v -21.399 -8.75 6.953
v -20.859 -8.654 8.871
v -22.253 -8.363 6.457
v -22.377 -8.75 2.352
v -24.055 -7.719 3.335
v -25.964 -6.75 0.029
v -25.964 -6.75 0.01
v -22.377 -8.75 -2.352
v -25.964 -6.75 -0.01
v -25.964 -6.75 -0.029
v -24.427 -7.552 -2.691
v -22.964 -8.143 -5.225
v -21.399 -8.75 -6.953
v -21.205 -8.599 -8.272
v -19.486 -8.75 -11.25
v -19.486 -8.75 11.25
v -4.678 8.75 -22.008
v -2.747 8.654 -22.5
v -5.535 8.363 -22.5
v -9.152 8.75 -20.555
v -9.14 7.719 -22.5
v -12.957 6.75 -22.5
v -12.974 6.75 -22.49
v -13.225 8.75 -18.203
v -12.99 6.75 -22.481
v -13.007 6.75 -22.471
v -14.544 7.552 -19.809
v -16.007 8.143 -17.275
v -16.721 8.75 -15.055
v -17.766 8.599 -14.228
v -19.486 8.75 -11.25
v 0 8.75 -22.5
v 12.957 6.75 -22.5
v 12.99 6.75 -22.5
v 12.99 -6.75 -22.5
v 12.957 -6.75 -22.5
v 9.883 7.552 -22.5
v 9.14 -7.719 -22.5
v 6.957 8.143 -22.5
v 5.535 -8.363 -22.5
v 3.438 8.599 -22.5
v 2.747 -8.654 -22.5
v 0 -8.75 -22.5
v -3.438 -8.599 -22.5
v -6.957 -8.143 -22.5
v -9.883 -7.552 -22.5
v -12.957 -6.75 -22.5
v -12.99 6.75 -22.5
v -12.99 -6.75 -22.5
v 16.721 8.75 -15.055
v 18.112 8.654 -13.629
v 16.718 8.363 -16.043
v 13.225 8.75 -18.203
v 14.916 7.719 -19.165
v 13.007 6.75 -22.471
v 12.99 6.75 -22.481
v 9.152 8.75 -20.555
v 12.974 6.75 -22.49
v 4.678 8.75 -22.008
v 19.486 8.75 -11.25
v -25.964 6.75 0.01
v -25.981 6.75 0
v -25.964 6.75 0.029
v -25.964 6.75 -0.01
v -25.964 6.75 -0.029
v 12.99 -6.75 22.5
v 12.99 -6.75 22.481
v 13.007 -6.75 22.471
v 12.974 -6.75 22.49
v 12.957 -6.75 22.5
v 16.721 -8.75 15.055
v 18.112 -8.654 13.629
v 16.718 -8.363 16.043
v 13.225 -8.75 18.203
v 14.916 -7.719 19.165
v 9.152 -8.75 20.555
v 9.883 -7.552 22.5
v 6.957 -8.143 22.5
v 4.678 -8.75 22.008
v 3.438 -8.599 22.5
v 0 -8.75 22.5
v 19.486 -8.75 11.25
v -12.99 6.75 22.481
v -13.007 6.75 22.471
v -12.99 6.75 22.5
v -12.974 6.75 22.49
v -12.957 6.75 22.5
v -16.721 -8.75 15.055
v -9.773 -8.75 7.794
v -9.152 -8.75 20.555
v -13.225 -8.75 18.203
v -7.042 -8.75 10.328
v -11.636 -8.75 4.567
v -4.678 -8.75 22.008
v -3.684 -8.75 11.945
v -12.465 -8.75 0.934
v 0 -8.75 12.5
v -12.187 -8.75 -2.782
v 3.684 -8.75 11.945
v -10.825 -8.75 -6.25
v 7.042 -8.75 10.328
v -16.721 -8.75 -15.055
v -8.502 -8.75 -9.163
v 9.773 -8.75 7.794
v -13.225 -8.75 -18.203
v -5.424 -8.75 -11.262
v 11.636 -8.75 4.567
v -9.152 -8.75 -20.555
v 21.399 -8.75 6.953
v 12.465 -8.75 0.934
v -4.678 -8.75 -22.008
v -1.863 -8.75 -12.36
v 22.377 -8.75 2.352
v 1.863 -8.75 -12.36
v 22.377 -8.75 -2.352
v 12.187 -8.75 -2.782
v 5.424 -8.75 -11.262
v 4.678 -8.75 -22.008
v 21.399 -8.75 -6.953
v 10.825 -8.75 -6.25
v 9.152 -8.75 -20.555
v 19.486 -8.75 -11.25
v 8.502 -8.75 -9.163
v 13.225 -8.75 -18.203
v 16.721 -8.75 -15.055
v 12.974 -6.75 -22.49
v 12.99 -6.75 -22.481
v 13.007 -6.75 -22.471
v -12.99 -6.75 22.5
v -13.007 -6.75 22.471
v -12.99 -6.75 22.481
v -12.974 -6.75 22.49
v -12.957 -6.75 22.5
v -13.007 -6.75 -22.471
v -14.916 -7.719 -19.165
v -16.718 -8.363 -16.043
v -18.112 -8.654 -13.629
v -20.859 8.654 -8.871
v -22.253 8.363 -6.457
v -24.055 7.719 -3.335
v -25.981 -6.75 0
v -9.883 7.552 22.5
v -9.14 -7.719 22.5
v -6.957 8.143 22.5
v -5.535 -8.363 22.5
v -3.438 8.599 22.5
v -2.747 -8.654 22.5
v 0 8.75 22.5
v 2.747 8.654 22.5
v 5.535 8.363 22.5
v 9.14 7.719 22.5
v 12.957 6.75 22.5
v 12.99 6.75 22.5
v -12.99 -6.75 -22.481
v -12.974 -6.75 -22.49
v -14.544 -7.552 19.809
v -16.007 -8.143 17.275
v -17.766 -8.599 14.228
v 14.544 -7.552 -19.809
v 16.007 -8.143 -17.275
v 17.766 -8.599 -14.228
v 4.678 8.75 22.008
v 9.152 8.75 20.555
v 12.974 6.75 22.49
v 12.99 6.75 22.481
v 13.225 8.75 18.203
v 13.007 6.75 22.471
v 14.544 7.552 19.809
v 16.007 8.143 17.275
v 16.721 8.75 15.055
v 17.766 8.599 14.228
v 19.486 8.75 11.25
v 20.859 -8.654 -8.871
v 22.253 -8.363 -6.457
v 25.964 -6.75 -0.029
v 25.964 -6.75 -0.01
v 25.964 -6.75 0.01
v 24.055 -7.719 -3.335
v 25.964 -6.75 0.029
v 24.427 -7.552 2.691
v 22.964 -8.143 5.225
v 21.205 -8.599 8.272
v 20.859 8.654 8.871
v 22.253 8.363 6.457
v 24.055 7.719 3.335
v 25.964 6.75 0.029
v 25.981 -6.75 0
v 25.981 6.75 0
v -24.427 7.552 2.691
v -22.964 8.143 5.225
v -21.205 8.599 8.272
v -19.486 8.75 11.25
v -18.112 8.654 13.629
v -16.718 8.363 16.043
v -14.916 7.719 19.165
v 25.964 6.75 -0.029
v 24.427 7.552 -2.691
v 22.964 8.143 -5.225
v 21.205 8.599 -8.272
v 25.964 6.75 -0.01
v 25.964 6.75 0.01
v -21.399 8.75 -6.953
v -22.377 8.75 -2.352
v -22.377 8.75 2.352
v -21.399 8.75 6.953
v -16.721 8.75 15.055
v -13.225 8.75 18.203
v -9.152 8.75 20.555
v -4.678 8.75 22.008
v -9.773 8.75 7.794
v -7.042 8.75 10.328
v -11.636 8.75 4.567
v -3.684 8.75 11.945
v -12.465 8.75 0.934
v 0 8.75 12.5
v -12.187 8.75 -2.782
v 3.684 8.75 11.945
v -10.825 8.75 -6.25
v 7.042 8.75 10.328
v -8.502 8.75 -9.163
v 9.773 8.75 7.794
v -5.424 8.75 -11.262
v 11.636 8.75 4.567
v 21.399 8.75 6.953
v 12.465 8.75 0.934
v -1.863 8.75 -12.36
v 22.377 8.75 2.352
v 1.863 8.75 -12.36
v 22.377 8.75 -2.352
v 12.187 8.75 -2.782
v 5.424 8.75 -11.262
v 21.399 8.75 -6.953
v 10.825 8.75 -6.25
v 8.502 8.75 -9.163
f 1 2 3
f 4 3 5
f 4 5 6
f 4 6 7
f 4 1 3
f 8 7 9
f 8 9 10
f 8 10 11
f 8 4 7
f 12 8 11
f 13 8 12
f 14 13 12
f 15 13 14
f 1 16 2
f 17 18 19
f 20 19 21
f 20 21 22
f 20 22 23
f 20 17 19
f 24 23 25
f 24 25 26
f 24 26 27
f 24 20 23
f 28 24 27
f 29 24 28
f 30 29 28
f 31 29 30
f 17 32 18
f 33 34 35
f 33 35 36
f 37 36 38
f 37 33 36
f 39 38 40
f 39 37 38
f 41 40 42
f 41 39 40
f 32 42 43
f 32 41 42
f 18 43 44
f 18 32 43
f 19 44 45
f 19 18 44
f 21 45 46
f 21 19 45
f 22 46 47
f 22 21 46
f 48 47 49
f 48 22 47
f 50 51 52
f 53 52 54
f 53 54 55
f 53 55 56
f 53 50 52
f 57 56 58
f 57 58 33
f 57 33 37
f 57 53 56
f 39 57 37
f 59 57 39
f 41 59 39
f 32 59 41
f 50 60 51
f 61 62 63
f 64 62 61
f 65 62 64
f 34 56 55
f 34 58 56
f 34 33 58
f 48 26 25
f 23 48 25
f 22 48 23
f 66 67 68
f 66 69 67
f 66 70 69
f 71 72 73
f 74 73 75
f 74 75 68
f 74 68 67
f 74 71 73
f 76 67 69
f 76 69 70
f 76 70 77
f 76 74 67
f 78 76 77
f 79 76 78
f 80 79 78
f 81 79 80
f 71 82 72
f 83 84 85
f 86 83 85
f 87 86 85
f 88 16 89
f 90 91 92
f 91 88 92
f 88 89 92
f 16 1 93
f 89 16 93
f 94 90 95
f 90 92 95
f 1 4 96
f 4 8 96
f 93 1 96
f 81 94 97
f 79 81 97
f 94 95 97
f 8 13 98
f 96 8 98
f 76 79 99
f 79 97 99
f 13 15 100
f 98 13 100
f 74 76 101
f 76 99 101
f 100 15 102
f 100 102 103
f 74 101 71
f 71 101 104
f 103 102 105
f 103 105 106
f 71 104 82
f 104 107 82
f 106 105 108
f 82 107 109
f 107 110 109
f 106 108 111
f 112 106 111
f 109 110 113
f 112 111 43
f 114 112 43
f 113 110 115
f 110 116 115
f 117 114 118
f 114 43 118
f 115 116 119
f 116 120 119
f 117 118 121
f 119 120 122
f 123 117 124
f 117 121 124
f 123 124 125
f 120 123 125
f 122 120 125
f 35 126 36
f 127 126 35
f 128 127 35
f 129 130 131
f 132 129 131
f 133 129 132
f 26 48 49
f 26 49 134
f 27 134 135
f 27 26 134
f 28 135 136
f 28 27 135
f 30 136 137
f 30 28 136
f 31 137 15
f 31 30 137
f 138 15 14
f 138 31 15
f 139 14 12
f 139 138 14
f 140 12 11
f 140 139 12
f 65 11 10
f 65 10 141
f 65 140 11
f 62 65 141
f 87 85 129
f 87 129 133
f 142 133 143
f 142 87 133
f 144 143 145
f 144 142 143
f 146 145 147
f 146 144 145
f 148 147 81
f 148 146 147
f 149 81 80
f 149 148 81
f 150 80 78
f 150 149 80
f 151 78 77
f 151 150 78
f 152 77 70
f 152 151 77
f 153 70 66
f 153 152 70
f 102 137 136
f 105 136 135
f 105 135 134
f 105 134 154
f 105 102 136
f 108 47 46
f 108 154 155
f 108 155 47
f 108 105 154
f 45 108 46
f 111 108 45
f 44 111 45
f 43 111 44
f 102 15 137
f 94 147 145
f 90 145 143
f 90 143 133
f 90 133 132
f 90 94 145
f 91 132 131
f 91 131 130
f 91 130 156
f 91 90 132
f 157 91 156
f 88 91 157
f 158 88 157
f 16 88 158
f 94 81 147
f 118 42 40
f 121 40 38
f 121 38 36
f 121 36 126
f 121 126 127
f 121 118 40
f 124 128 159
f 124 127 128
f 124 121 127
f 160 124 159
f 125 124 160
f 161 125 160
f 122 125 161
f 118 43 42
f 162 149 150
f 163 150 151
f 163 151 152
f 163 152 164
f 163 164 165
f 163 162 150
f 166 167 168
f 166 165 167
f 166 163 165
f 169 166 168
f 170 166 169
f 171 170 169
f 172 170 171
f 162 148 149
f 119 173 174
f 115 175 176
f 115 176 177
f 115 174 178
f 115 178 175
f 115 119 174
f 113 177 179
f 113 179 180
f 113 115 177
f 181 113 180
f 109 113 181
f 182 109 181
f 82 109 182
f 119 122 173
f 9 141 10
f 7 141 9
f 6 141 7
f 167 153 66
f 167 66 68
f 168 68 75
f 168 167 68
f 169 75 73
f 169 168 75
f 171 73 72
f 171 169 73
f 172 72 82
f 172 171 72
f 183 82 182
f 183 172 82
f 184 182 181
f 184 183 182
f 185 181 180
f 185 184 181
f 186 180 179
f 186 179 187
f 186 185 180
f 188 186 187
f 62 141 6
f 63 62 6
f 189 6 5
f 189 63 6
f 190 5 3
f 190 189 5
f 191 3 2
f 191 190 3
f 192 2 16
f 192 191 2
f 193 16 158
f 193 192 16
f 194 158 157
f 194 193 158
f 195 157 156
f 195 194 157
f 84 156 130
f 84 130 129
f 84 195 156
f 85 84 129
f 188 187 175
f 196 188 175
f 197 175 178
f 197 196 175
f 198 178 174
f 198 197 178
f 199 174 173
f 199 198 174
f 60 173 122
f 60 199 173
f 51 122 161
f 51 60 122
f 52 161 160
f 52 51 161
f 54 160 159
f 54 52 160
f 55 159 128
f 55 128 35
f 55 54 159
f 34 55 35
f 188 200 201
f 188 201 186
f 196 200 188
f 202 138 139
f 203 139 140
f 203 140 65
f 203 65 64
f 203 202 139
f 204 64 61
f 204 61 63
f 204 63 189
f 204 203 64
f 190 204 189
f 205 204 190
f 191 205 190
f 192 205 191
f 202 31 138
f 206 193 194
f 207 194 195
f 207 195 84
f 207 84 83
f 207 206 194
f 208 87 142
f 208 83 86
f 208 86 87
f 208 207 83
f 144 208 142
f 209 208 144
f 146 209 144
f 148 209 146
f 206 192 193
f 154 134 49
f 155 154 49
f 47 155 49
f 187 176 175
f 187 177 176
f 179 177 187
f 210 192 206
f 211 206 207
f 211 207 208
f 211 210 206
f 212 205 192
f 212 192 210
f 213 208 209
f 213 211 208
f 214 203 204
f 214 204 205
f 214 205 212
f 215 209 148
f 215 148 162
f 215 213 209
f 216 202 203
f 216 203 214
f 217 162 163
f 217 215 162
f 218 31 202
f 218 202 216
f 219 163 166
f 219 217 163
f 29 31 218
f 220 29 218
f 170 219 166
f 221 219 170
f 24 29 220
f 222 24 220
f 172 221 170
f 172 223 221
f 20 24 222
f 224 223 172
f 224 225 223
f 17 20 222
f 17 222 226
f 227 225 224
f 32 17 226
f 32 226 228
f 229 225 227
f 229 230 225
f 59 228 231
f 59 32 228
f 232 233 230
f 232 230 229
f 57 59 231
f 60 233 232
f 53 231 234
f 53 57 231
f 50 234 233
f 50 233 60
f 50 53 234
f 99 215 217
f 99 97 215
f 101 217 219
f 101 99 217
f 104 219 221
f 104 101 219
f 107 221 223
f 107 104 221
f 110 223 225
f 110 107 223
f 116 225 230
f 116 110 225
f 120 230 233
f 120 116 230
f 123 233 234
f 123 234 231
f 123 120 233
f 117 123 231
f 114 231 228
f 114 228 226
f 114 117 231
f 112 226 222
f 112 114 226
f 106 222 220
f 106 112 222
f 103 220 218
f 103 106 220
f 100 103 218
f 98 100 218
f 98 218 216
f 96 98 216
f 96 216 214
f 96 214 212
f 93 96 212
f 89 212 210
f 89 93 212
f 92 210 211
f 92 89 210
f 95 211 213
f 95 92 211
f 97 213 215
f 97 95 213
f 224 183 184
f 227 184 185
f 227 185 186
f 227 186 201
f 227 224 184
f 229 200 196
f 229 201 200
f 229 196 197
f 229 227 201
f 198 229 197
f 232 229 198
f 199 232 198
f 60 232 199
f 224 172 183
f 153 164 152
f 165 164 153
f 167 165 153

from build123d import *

# Parameters (mm, degrees)
SKETCH3_R               = 12.5
BOSS_EXTRUDE1_DEPTH     = 8.75
SKETCH4_OUTSIDE_W       = 75.076
SKETCH4_OUTSIDE_H       = 68.114
SKETCH4_OUTSIDE_R       = 22.5
CUT_EXTRUDE1_DEPTH      = 2
CUT_EXTRUDE1_DRAFT      = -60
MIRROR1_COPY_1_SKETCH_W = 75.076
MIRROR1_COPY_1_SKETCH_H = 68.114
MIRROR1_COPY_1_SKETCH_R = 22.5
MIRROR1_COPY_1_DEPTH    = 2
MIRROR1_COPY_1_DRAFT    = -60


with BuildPart() as part:
    # Sketch3 → Boss-Extrude1 (new, symmetric)
    with BuildSketch(Plane(origin=(0, 0, 0), x_dir=(1, 0, 0), z_dir=(0, 1, 0))):
        Polygon((25.980762114, 0), (12.990381057, 22.5), (-12.990381057, 22.5), (-25.980762114, 0), (-12.990381057, -22.5), (12.990381057, -22.5), align=None)
        with Locations(Location((0, 0, 0), (0, 0, 270))):
            Circle(SKETCH3_R, mode=Mode.SUBTRACT)
    extrude(amount=BOSS_EXTRUDE1_DEPTH, both=True)


with BuildPart() as cut_extrude1_tool:
    # Sketch4 outside → Cut-Extrude1 (with draft: the straight prism first)
    with BuildSketch(Plane.XZ.offset(8.75)):
        Rectangle(SKETCH4_OUTSIDE_W, SKETCH4_OUTSIDE_H)
        Circle(SKETCH4_OUTSIDE_R, mode=Mode.SUBTRACT)
    extrude(amount=-CUT_EXTRUDE1_DEPTH)
    # Cut-Extrude1: the draft: its side faces are tilted about the plane it starts from
    cut_extrude1_sides = [cut_extrude1_tool.faces().sort_by_distance(p)[0] for p in [
        (0, -7.75, -34.057),
        (37.538, -7.75, 0),
        (0, -7.75, 34.057),
        (-37.538, -7.75, 0),
        (-22.5, -7.75, 0),
    ]]
    draft(cut_extrude1_sides, Plane.XZ.offset(8.75), CUT_EXTRUDE1_DRAFT)


with BuildPart() as part_1:
    add(part.part)

    # Cut-Extrude1: cut by cut_extrude1_tool
    add(cut_extrude1_tool.part, mode=Mode.SUBTRACT)


with BuildPart() as mirror1_copy_1_tool:
    # Mirror1 copy 1 sketch → Mirror1 copy 1 (with draft: the straight prism first)
    with BuildSketch(Plane(origin=(0, 8.75, 0), x_dir=(1, 0, 0), z_dir=(0, 1, 0))):
        Rectangle(MIRROR1_COPY_1_SKETCH_W, MIRROR1_COPY_1_SKETCH_H)
        Circle(MIRROR1_COPY_1_SKETCH_R, mode=Mode.SUBTRACT)
    extrude(amount=-MIRROR1_COPY_1_DEPTH)
    # Mirror1 copy 1: the draft: its side faces are tilted about the plane it starts from
    mirror1_copy_1_sides = [mirror1_copy_1_tool.faces().sort_by_distance(p)[0] for p in [
        (0, 7.75, -34.057),
        (37.538, 7.75, 0),
        (0, 7.75, 34.057),
        (-37.538, 7.75, 0),
        (-22.5, 7.75, 0),
    ]]
    draft(mirror1_copy_1_sides, Plane(origin=(0, 8.75, 0), x_dir=(1, 0, 0), z_dir=(0, 1, 0)), MIRROR1_COPY_1_DRAFT)


with BuildPart() as part_2:
    add(part_1.part)

    # Mirror1 copy 1: cut by mirror1_copy_1_tool
    add(mirror1_copy_1_tool.part, mode=Mode.SUBTRACT)


solid = part_2.part
